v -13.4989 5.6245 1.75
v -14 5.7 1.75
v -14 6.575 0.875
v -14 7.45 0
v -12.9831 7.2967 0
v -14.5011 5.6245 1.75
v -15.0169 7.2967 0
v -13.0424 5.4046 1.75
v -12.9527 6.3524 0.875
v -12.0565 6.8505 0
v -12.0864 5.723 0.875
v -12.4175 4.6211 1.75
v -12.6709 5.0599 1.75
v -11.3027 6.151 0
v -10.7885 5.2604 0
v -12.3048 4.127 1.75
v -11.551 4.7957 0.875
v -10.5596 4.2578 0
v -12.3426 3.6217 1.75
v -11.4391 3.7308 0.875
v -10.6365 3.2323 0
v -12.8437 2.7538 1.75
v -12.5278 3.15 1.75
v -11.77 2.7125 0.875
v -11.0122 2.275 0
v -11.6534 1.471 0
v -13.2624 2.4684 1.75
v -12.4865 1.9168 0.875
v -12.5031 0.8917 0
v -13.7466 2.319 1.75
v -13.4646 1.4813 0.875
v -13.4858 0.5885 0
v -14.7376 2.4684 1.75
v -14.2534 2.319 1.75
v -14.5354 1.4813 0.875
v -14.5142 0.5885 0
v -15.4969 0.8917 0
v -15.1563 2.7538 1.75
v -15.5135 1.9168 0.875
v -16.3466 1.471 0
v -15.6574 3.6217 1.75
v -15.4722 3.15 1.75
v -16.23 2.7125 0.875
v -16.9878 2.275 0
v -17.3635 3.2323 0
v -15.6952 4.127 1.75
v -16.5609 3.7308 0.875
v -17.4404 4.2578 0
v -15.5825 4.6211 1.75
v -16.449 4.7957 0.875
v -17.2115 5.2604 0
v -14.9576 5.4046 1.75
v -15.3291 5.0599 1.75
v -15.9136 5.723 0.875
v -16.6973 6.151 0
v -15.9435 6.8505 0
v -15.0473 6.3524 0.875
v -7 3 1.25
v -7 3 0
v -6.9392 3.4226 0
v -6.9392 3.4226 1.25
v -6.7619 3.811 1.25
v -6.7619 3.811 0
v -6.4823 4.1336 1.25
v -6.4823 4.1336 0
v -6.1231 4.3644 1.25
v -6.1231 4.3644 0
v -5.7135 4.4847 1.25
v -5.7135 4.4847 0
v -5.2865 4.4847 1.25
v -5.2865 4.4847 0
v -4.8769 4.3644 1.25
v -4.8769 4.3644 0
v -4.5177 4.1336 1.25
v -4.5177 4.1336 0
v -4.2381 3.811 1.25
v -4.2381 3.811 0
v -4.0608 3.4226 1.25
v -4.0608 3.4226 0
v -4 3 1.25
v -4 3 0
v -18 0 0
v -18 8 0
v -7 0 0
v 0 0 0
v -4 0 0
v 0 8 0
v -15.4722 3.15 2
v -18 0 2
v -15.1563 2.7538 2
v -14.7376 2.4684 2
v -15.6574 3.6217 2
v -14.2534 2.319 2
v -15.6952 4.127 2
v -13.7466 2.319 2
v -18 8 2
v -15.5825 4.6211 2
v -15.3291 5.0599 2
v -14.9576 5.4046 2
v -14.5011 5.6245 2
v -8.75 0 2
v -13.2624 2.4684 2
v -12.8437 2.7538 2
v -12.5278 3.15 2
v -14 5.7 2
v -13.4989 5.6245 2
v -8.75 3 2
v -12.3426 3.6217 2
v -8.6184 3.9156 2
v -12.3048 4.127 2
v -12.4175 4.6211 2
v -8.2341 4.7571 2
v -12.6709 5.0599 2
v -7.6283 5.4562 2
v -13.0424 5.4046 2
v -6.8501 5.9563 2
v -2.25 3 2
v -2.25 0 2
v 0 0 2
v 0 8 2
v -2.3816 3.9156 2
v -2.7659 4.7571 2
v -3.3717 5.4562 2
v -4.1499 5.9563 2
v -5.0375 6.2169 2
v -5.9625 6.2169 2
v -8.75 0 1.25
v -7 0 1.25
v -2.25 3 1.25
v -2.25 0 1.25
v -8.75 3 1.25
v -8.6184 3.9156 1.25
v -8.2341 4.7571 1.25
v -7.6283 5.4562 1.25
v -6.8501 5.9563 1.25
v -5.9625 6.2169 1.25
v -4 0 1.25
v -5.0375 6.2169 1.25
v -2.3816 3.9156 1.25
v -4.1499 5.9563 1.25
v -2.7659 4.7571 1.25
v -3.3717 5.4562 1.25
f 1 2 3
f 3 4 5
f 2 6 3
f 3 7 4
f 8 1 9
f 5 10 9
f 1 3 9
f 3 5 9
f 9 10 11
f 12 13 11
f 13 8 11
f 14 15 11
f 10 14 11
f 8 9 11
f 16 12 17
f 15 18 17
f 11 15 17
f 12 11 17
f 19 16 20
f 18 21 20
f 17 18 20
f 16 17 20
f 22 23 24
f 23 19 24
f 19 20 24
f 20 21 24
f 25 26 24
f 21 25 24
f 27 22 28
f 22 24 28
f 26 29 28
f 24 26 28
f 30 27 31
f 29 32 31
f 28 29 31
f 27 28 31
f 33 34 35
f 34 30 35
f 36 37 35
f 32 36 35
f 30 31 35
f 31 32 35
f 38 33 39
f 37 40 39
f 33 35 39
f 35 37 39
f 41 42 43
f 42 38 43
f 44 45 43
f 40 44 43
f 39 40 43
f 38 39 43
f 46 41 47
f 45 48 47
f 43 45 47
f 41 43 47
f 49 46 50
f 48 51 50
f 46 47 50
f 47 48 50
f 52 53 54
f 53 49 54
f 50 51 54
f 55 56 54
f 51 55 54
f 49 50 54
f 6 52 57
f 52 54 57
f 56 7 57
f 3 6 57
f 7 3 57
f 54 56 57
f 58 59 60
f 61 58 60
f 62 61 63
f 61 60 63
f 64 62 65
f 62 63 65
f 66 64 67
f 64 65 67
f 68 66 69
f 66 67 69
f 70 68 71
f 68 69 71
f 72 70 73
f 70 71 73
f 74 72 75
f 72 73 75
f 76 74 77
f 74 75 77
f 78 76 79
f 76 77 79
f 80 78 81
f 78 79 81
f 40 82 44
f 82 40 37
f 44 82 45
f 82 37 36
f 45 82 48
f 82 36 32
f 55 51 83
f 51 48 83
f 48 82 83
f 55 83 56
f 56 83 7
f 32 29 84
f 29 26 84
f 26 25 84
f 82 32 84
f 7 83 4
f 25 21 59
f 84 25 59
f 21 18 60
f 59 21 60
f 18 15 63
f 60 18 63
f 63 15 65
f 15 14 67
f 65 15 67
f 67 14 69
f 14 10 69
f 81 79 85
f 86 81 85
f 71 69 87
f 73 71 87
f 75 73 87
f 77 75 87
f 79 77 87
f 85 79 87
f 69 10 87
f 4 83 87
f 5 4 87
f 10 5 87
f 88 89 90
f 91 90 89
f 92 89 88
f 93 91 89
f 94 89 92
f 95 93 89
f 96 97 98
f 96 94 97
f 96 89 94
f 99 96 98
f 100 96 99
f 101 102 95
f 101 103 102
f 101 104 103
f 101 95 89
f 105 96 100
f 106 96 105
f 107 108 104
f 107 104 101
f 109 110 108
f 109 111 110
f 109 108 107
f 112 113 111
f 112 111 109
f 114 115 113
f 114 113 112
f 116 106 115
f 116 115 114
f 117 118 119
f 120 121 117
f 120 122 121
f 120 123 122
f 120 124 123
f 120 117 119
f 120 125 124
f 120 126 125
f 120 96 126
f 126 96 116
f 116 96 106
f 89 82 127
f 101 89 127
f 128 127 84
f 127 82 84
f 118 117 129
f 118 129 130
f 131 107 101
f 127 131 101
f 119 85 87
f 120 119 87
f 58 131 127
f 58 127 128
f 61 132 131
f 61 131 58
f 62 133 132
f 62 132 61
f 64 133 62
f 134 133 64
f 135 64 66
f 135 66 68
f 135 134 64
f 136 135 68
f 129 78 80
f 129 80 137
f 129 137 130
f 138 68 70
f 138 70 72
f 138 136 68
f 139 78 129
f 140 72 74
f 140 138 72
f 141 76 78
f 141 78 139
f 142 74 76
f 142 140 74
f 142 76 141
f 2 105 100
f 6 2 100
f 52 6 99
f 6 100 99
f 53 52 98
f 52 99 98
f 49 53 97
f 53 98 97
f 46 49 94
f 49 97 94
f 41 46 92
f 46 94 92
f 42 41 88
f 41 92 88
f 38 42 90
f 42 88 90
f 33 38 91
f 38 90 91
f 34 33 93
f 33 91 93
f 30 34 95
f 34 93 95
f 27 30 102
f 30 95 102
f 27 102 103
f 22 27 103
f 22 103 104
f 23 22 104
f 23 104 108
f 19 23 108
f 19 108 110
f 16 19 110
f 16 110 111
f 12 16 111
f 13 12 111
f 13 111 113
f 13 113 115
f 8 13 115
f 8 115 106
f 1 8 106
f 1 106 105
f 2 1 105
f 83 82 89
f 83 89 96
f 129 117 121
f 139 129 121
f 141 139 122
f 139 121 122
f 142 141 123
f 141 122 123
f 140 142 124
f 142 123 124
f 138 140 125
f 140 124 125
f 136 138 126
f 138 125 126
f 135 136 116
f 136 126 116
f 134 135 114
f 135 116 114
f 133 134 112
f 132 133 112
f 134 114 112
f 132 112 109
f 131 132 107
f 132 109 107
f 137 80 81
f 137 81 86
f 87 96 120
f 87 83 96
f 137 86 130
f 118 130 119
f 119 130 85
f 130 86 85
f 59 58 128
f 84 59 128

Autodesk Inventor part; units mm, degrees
ref_plane "YZ Plane" through (0, 0, 0) normal (1, 0, 0) x (0, 1, 0)
ref_plane "XZ Plane" through (0, 0, 0) normal (0, 1, 0) x (-1, 0, 0)
ref_plane "XY Plane" through (0, 0, 0) normal (0, 0, 1) x (1, 0, 0)
sketch "Skizze1" plane through (0, 0, 0) normal (0, 0, 1) x (1, 0, 0)
  line L0 (-21.6, 0) -> (3.6, 0) projected
  line L1 (0, -1.6) -> (0, 9.6) projected
  line L2 (0, 0) -> (-18, 0)
  line L3 (-18, 0) -> (-18, 8)
  line L4 (-18, 8) -> (0, 8)
  line L5 (0, 8) -> (0, 0)
  dimension "d0" = 8
  dimension "d1" = 18
extrude "Extrusion1" add sketch "Skizze1" along normal blind 2
sketch "Skizze2" plane through (0, 0, 2) normal (0, 0, 1) x (1, 0, 0)
  line L0 (-18, 0) -> (0, 0) projected
  line L1 (0, 0) -> (0, 8) projected
  point P0 (-5.5, 3)
  dimension "d4" = 5.5
  dimension "d5" = 3
hole "Bohrung1" at (-5.5, 3, 2) direction (0, 0, -1) diameter 3 depth 8 tip angle 118
sketch "Skizze3" plane through (0, 0, 2) normal (0, 0, 1) x (1, 0, 0)
  circle A0 centre (-5.5, 3) radius 1.5 projected
  line L0 (-18, 0) -> (0, 0) projected
  arc A1 (-2.25, 3) -> (-8.75, 3) centre (-5.5, 3) ccw
  line L1 (-8.75, 3) -> (-8.75, 0)
  line L2 (-2.25, 3) -> (-2.25, 0)
  dimension "d13" = 6.5
extrude "Extrusion2" cut sketch "Skizze3" against normal blind 0.75
sketch "Skizze4" plane through (0, 0, 1.25) normal (0, 0, 1) x (1, 0, 0)
  circle A0 centre (-5.5, 3) radius 1.5 projected
  line L0 (-2.25, 0) -> (-8.75, 0) projected
  line L1 (-7, 3) -> (-7, 0)
  line L2 (-4, 3) -> (-4, 0)
  point P0 (0, 0)
extrude "Extrusion3" cut sketch "Skizze4" against normal through all contours L2 L0 L1 A0
sketch "Skizze5" plane through (0, 0, 0) normal (0, 0, -1) x (-1, 0, 0)
  line L0 (7, 0) -> (18, 0) projected
  line L1 (18, 0) -> (18, 8) projected
  arc A0 (8.75, 3) -> (2.25, 3) centre (5.5, 3) ccw projected
  point P0 (14, 4)
  dimension "d18" = 4
  dimension "d19" = 4
hole "Bohrung2" at (-14, 4, 0) direction (0, 0, 1) diameter 3.4 end through all countersink diameter 6.9 countersink angle 90
properties part number "13_1087_036"
